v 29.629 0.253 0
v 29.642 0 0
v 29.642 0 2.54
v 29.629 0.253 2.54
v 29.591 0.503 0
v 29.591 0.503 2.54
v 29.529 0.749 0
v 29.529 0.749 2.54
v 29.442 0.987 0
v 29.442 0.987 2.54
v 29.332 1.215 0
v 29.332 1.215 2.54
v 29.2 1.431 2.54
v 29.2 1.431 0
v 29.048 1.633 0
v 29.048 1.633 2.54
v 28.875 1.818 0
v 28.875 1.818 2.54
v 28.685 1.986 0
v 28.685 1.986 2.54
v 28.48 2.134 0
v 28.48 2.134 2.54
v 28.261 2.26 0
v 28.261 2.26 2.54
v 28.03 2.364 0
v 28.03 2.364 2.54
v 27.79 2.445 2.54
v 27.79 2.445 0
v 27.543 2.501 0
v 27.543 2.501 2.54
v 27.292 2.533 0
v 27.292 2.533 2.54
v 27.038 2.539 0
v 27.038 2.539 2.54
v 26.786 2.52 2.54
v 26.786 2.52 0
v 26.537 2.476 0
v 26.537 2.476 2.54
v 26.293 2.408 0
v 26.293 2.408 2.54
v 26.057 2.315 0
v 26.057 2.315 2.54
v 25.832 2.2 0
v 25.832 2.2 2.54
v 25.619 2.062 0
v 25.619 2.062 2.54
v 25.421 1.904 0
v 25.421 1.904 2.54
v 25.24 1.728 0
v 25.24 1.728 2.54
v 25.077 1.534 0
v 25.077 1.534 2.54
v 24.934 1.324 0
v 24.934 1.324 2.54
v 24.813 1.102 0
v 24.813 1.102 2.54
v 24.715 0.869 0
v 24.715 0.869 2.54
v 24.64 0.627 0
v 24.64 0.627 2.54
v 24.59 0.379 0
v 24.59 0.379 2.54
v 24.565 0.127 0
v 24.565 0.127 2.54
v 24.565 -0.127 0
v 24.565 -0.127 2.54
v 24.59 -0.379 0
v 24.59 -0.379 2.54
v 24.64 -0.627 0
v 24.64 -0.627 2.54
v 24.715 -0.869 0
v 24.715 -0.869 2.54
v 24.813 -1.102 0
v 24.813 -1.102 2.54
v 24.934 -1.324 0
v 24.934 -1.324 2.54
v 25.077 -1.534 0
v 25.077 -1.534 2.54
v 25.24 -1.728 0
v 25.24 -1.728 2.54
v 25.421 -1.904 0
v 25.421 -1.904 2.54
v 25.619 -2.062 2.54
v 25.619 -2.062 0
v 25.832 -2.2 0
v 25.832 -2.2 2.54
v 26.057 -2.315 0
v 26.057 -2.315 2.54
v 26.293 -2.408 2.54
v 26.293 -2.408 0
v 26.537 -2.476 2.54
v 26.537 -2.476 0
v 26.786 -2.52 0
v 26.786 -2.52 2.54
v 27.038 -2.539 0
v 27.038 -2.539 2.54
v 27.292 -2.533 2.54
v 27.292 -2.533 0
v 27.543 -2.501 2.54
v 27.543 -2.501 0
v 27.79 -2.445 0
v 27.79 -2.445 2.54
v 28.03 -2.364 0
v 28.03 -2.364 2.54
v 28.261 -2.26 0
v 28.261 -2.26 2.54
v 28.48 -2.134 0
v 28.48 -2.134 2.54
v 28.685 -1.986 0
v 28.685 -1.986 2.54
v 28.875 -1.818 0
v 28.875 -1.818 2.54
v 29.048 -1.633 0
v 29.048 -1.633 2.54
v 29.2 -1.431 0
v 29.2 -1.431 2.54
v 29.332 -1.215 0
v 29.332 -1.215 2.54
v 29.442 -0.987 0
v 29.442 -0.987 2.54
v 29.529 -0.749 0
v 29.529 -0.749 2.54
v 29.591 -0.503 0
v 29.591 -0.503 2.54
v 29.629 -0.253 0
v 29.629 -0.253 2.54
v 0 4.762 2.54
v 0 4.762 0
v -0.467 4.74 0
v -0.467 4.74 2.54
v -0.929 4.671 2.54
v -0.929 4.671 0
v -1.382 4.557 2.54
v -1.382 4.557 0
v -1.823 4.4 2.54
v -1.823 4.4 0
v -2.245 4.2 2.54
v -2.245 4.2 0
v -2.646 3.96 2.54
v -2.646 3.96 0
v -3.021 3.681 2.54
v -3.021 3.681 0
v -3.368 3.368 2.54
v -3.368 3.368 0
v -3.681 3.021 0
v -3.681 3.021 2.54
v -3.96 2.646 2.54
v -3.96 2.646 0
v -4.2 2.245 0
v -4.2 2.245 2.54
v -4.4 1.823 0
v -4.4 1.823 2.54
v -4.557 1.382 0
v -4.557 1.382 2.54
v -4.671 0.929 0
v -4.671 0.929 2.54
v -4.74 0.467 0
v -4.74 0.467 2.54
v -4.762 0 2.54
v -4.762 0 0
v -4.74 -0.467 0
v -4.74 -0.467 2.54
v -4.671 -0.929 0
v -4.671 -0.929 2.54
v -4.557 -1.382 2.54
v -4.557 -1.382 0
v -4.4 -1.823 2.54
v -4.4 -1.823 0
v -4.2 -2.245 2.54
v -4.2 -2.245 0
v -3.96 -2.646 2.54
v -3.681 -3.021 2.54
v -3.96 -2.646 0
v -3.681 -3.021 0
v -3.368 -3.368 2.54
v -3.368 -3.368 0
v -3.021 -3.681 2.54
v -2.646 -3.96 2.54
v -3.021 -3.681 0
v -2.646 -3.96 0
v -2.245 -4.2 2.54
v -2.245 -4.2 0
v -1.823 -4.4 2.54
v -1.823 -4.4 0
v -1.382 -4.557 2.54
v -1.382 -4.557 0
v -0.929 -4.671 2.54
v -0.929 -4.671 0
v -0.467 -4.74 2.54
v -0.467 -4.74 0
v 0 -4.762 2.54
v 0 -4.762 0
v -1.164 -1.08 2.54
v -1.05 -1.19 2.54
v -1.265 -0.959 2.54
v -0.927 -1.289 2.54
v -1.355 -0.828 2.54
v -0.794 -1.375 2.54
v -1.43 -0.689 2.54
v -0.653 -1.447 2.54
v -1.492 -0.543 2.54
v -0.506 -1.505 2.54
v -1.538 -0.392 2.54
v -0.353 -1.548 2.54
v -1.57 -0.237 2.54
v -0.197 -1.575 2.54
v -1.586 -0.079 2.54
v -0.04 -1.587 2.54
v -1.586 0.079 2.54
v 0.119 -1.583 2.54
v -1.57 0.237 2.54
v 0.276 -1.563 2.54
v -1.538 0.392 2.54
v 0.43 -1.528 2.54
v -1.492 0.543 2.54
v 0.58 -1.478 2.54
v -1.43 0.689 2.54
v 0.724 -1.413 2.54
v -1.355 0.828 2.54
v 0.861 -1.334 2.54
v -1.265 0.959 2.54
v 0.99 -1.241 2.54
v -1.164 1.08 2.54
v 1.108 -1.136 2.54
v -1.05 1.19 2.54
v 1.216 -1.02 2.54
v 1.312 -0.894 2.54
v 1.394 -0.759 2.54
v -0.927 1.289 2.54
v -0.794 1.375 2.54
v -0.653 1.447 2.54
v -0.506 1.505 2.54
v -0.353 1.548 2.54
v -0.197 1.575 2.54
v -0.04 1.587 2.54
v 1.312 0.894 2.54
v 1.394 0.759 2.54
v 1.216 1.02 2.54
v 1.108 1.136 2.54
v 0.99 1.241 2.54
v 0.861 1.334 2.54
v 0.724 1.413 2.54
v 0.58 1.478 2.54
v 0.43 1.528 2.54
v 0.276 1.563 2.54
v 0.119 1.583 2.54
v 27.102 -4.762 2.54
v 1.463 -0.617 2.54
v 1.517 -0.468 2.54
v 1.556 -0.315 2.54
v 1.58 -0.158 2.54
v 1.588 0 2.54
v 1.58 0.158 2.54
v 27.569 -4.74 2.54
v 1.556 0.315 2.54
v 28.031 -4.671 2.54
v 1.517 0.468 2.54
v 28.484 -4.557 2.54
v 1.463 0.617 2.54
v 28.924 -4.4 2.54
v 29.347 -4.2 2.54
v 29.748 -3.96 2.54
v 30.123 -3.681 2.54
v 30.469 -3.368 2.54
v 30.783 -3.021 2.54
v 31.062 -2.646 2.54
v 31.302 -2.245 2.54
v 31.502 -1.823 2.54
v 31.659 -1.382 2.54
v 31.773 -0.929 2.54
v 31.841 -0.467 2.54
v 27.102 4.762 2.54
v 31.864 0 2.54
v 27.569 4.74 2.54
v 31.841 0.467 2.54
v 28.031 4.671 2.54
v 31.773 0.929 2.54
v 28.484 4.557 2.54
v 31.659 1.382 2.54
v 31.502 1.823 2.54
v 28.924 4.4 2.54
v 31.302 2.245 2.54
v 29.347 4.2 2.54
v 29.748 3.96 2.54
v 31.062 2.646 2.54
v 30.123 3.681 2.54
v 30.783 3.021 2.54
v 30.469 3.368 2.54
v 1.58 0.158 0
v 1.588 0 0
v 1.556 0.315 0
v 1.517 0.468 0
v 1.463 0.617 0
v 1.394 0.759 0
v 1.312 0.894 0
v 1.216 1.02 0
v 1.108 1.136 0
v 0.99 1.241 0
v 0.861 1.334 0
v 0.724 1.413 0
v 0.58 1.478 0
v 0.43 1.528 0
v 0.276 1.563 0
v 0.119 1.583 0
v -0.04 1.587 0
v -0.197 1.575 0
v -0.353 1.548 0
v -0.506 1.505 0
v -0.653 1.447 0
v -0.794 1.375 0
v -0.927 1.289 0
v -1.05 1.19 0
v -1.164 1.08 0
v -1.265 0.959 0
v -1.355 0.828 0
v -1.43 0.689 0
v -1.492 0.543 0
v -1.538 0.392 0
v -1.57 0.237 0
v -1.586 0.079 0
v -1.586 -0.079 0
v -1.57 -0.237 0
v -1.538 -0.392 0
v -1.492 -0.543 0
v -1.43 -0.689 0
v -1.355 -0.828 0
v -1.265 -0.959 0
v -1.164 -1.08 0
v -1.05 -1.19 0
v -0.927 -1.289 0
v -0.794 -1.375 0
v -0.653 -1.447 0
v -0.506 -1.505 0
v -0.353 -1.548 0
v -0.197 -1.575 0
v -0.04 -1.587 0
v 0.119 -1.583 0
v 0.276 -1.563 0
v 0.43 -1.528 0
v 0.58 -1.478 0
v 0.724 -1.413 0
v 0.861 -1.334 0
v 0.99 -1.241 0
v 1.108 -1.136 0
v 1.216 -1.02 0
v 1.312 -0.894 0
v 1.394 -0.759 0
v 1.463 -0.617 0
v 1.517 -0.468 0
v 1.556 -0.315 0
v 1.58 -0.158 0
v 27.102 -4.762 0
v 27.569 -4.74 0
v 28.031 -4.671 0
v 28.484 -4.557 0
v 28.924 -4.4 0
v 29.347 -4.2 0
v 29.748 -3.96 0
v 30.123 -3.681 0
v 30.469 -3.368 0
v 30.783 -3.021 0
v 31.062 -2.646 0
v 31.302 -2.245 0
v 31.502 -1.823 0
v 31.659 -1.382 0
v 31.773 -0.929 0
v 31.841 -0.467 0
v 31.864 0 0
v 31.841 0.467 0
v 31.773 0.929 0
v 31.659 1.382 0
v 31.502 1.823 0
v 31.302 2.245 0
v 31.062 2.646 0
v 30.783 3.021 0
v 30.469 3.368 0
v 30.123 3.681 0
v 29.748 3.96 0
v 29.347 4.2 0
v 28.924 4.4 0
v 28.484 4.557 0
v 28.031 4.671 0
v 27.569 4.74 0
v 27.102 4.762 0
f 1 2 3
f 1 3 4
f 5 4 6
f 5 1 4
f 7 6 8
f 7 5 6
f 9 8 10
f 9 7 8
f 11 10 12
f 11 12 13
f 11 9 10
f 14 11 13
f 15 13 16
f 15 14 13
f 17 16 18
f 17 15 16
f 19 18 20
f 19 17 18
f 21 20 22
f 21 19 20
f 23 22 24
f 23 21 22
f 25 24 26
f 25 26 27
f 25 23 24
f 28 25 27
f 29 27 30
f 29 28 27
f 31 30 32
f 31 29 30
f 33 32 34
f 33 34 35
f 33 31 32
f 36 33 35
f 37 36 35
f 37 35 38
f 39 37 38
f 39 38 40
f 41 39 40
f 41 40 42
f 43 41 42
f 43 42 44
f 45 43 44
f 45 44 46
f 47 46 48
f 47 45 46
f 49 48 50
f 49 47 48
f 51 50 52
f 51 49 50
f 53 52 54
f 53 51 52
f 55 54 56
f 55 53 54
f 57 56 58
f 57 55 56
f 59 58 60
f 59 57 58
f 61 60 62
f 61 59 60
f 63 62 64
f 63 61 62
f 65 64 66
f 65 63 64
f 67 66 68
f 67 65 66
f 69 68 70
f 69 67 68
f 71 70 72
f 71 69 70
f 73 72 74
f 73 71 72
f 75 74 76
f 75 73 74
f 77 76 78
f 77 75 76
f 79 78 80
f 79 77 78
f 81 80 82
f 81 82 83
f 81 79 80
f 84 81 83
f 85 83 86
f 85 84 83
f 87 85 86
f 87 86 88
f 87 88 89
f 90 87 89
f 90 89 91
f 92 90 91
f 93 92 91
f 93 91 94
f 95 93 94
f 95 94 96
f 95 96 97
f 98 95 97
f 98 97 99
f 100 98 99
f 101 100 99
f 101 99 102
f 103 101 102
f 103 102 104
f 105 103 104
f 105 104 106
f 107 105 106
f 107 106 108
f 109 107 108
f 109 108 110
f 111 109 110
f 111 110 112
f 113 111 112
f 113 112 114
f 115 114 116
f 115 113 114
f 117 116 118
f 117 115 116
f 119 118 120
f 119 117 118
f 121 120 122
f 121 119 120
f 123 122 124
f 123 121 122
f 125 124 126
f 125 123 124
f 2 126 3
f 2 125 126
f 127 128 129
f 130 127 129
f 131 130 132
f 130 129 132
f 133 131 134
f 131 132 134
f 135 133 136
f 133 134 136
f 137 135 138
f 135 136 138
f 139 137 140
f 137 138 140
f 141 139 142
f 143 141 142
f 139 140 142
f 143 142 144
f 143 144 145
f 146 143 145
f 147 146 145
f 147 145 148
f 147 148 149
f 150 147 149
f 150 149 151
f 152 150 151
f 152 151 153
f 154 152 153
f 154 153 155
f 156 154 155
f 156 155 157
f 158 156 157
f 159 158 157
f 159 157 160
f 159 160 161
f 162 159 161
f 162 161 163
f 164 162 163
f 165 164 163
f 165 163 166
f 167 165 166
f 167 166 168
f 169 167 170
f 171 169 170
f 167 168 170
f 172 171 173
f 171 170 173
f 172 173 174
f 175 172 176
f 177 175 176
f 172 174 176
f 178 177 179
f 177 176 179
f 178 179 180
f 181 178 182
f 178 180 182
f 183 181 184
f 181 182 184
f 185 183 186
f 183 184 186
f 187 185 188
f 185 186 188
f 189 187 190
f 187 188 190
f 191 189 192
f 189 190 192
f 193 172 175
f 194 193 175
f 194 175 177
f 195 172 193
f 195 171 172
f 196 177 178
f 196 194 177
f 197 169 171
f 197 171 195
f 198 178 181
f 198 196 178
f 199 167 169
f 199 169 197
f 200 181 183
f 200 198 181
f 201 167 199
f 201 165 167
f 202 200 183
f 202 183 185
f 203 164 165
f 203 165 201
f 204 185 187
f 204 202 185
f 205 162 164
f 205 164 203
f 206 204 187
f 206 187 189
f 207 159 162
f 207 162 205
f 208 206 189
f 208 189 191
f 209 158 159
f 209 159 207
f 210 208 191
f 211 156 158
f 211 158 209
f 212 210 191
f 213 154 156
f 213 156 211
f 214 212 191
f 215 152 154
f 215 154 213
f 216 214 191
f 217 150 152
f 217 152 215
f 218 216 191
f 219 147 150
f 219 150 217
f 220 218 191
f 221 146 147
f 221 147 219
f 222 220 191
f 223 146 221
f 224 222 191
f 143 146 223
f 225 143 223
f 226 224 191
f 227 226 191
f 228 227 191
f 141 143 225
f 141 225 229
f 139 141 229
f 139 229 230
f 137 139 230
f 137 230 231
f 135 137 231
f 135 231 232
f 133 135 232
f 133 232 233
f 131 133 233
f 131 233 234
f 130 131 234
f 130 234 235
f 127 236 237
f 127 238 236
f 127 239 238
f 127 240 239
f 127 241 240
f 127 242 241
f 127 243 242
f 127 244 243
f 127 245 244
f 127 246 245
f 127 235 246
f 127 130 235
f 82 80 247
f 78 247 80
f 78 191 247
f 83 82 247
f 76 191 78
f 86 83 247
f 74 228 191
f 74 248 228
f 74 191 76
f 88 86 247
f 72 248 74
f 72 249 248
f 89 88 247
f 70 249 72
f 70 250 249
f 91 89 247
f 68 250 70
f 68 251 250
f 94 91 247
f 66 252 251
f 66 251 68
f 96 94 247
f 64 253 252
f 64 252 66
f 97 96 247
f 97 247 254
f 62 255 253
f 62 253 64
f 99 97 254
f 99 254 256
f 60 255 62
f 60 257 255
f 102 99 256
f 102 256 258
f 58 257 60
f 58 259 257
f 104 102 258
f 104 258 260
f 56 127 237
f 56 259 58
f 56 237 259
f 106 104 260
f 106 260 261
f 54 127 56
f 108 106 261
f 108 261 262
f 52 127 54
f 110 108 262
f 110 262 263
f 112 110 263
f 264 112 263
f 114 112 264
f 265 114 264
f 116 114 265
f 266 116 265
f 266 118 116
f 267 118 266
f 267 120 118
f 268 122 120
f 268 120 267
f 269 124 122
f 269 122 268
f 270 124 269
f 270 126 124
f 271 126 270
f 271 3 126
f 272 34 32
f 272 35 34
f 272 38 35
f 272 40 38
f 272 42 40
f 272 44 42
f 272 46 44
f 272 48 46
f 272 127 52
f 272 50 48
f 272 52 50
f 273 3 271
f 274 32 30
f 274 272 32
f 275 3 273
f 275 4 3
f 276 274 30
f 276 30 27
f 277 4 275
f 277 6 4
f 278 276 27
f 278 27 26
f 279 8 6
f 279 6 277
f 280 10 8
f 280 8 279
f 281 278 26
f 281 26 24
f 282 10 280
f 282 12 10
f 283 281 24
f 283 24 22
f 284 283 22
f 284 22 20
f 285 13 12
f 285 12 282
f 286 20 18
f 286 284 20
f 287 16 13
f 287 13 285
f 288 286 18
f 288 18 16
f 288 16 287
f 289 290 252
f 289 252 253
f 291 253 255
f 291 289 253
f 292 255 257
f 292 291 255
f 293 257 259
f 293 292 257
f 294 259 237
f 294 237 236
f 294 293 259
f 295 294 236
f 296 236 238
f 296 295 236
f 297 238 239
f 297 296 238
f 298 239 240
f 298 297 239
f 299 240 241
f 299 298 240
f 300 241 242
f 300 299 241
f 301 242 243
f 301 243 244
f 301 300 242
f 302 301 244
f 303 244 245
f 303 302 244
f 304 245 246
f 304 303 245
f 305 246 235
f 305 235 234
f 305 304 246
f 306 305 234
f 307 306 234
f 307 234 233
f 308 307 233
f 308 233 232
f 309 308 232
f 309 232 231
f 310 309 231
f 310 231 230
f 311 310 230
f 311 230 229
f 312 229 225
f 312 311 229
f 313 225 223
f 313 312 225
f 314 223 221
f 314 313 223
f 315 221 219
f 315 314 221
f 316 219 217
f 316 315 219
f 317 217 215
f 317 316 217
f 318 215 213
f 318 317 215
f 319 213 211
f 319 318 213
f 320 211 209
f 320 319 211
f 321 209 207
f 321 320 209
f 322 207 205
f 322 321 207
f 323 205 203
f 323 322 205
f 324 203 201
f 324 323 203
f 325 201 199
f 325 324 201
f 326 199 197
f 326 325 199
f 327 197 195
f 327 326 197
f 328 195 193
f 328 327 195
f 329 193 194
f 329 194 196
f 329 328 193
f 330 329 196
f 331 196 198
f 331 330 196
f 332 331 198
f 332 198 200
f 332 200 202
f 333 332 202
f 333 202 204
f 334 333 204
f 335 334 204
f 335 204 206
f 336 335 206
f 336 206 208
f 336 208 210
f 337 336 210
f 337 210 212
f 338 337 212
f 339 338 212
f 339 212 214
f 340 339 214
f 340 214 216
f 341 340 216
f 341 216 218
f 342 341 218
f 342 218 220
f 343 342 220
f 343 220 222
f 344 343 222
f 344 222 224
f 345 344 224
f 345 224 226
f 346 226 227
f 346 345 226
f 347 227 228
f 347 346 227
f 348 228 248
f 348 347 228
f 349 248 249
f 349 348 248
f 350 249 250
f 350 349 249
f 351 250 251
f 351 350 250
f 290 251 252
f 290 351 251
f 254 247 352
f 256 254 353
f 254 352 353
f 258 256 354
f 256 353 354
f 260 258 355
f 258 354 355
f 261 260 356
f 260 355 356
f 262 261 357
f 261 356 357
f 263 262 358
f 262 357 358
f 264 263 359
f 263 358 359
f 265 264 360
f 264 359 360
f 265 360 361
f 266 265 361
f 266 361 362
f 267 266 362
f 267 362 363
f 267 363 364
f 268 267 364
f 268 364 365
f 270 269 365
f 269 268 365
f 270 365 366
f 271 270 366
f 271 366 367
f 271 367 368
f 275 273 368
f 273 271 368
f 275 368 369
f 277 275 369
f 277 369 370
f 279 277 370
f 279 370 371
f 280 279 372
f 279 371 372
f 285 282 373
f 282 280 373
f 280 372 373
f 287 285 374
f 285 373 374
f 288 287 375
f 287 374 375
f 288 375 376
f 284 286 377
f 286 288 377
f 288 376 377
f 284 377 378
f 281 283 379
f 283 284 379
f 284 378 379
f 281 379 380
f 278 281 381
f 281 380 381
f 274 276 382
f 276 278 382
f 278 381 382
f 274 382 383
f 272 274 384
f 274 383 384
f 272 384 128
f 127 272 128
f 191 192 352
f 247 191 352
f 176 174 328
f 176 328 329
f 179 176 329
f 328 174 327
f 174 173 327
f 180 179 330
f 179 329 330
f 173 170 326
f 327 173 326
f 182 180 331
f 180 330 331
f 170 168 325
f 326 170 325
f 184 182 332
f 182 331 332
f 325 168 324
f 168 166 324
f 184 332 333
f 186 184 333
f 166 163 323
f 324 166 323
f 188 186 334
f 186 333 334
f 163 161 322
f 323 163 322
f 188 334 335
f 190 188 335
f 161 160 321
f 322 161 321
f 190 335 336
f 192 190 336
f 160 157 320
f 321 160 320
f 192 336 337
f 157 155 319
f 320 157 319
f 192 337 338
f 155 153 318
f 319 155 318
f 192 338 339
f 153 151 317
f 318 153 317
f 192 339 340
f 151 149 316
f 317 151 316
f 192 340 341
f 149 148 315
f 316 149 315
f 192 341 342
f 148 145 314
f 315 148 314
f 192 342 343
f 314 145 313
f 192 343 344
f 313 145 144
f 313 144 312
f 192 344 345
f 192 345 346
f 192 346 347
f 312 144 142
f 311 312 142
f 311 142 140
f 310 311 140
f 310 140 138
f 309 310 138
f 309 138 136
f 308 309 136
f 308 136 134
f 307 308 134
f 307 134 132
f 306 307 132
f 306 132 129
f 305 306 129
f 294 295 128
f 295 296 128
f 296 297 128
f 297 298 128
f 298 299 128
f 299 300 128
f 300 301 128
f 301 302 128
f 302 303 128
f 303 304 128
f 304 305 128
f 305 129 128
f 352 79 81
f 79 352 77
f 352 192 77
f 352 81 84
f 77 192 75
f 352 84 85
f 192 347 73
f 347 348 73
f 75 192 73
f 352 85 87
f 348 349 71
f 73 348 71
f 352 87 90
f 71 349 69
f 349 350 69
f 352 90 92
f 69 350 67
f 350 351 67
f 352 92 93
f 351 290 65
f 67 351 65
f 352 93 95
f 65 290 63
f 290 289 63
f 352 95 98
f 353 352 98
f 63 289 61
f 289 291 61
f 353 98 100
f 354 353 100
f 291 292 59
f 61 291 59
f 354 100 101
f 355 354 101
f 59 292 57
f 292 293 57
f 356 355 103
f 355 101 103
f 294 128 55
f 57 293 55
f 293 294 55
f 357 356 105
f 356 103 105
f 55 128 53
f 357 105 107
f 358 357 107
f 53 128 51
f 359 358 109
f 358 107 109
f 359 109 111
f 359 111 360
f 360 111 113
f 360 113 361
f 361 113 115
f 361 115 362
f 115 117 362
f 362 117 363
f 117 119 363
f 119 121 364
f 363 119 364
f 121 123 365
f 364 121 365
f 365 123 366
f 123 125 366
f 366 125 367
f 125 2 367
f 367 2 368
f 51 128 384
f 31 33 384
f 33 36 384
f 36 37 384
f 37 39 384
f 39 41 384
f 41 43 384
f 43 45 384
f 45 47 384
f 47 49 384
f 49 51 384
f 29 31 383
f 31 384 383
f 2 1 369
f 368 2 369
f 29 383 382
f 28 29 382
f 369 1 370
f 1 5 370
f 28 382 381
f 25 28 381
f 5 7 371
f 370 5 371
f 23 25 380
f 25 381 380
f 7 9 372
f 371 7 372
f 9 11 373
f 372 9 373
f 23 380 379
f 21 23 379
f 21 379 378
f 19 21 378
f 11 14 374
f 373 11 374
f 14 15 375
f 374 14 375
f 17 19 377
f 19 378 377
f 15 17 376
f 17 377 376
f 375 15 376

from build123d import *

# Parameters (mm, degrees)
SKETCH1_R           = 4.7625
SKETCH1_R_2         = 1.5875
SKETCH1_R_3         = 2.54
BOSS_EXTRUDE2_DEPTH = 2.54


with BuildPart() as part:
    # Sketch1 → Boss-Extrude2 (new body)
    # profile 1 of 3: a face of its own
    with BuildSketch(Plane.XY):
        Circle(SKETCH1_R)
        Circle(SKETCH1_R_2, mode=Mode.SUBTRACT)
    # profile 2 of 3: a face of its own
    with BuildSketch(Plane.XY):
        with Locations((27.1018, 0)):
            Circle(SKETCH1_R)
        with Locations((27.1018, 0)):
            Circle(SKETCH1_R_3, mode=Mode.SUBTRACT)
    # profile 3 of 3: a face of its own
    with BuildSketch(Plane.XY):
        with BuildLine():
            Line((27.1018, 4.7625), (0, 4.7625))
            ThreePointArc((0, 4.7625), (3.367596045, 3.367596045), (4.7625, 0))
            ThreePointArc((4.7625, 0), (3.367596045, -3.367596045), (0, -4.7625))
            Line((0, -4.7625), (27.1018, -4.7625))
            ThreePointArc((27.1018, -4.7625), (22.3393, 0), (27.1018, 4.7625))
        make_face()
    extrude(amount=BOSS_EXTRUDE2_DEPTH)


solid = part.part
